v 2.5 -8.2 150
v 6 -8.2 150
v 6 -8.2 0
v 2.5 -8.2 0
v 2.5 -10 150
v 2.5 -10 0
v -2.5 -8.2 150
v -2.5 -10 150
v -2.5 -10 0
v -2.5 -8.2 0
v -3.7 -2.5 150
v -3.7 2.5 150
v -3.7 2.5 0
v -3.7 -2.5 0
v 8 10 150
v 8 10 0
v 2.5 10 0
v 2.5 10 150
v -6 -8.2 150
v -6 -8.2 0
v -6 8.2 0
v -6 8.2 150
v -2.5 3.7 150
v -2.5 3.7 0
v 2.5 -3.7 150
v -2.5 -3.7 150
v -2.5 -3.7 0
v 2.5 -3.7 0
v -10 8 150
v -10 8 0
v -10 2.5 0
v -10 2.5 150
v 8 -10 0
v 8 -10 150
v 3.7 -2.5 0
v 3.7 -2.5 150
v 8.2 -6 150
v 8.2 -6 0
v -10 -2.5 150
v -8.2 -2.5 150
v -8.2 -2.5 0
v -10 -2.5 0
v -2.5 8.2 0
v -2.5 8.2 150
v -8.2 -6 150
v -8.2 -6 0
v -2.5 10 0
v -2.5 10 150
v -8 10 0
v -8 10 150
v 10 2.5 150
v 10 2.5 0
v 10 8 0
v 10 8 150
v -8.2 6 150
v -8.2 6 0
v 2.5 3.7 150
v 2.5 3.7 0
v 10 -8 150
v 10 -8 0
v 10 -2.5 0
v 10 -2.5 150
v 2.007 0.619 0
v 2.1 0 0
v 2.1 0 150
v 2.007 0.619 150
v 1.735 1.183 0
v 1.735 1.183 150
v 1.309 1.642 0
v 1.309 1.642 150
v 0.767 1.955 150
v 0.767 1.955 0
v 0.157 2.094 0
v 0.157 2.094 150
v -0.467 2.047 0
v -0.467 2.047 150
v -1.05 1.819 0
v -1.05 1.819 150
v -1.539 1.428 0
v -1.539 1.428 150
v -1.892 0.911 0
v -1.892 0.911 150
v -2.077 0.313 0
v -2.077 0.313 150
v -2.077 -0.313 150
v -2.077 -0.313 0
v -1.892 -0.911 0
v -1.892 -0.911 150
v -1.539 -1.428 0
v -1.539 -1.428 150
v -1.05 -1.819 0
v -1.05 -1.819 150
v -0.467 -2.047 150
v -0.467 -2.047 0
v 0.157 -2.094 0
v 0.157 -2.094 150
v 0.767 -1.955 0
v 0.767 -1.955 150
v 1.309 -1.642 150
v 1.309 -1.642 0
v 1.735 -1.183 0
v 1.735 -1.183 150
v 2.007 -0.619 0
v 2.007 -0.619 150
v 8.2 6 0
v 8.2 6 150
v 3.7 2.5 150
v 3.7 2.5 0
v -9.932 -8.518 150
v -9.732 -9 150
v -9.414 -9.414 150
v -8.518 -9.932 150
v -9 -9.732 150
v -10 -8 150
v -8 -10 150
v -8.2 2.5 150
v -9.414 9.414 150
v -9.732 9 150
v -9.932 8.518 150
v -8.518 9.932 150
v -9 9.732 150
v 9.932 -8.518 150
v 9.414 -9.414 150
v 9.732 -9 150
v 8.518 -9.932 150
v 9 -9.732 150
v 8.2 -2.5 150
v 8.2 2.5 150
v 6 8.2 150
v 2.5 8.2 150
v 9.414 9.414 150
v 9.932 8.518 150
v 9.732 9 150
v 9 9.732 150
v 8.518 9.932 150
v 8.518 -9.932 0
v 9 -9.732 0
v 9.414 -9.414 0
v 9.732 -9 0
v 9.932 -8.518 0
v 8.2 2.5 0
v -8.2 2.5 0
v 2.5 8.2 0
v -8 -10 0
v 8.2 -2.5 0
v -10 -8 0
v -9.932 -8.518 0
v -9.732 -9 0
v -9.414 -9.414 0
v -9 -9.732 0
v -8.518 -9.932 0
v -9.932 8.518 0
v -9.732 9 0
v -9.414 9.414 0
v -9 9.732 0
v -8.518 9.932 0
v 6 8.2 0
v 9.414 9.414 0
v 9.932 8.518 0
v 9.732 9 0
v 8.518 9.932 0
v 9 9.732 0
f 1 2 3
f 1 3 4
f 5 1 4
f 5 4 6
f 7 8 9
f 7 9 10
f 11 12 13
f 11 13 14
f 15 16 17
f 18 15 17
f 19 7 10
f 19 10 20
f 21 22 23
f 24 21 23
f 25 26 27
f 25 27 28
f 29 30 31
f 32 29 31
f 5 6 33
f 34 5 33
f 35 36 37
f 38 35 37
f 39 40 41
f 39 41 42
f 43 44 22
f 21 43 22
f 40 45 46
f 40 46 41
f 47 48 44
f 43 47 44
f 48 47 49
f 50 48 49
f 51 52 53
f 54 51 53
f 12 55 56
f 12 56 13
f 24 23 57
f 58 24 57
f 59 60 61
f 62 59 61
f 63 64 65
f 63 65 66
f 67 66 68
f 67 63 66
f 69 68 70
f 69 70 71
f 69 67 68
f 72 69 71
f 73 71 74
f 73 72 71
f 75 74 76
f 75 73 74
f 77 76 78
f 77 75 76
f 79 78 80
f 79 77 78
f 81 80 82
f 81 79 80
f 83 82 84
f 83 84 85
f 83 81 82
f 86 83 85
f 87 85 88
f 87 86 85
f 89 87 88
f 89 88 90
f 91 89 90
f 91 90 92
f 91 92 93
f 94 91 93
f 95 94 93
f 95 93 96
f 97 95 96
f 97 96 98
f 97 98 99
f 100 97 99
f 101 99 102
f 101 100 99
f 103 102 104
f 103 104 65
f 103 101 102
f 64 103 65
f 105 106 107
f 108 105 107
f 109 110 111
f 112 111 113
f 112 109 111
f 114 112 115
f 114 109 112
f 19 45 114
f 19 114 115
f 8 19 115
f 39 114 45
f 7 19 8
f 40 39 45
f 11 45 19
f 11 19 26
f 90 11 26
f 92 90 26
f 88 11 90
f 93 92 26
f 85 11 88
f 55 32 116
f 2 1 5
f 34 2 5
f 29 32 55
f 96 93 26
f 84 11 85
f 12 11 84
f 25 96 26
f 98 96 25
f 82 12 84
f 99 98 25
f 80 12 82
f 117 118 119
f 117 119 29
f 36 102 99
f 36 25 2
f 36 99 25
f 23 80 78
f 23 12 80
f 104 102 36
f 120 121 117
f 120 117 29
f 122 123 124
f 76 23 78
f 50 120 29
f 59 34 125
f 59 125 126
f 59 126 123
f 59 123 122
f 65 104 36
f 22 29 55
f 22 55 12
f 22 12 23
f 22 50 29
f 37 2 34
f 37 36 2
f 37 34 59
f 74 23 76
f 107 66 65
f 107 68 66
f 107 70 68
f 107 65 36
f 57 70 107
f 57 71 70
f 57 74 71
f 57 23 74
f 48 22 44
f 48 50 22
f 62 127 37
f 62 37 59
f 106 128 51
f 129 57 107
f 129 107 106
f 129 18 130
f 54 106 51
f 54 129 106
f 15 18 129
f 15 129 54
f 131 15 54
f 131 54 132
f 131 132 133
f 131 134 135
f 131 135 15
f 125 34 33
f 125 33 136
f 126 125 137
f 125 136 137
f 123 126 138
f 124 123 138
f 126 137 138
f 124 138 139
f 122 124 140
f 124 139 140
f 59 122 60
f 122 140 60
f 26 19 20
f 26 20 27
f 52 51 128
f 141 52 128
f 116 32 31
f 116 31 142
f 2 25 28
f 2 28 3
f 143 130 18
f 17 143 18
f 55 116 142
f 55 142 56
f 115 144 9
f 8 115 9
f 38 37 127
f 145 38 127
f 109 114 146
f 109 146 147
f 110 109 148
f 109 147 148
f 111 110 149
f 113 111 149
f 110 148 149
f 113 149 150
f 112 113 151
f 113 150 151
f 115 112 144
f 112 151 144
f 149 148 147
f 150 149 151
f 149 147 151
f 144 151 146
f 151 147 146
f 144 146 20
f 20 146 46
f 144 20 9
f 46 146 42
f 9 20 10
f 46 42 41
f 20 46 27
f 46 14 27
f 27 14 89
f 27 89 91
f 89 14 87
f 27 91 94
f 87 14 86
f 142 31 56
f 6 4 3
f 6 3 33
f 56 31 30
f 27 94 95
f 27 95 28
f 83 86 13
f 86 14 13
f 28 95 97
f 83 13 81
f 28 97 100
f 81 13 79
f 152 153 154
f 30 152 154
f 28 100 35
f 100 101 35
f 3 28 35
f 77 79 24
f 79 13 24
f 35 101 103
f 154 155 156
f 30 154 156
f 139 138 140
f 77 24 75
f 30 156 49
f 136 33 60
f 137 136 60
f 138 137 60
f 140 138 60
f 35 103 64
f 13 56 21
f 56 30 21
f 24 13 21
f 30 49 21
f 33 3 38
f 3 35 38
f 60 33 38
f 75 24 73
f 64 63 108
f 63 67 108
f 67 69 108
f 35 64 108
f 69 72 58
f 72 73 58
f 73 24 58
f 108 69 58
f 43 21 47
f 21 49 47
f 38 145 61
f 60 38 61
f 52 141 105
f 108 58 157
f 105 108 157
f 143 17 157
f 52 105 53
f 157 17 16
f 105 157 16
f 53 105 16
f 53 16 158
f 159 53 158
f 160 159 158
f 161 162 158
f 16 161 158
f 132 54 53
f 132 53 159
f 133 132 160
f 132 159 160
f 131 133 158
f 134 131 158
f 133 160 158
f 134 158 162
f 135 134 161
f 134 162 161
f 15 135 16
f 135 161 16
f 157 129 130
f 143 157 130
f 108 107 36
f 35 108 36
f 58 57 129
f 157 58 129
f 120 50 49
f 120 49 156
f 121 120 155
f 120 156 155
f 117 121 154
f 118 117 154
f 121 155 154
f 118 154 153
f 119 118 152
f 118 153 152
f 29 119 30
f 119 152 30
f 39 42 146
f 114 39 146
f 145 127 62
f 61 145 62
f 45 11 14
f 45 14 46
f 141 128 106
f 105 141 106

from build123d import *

# Parameters (mm, degrees)
EXTRUSION1_DEPTH        = 150
PER_AGE1_OUTLINE_R      = 2.1
PER_AGE1_DEPTH          = 150
ENL_V_MAT_EXTRU_1_DEPTH = 300
ENL_V_MAT_EXTRU_3_DEPTH = 300
ENL_V_MAT_EXTRU_4_DEPTH = 151.665191733
ENL_V_MAT_EXTRU_7_DEPTH = 151.665191733


# Read off the part's stored shape, not the designer's step: Perçage1
with BuildPart() as part:
    # Esquisse1 → Extrusion1 (new body)
    with BuildSketch(Plane.XY):
        with BuildLine():
            Line((-10, 8), (-10, -8))
            ThreePointArc((-10, -8), (-9.414213562, -9.414213562), (-8, -10))
            Line((-8, -10), (8, -10))
            ThreePointArc((8, -10), (9.414213562, -9.414213562), (10, -8))
            Line((10, -8), (10, 8))
            ThreePointArc((10, 8), (9.414213562, 9.414213562), (8, 10))
            Line((8, 10), (-8, 10))
            ThreePointArc((-8, 10), (-9.414213562, 9.414213562), (-10, 8))
        make_face()
    extrude(amount=EXTRUSION1_DEPTH)

    # Perçage1 outline → Perçage1 (cut)
    with BuildSketch(Plane.XY):
        Circle(PER_AGE1_OUTLINE_R)
    extrude(amount=PER_AGE1_DEPTH, mode=Mode.SUBTRACT)

    # Esquisse3 → Enlèv. mat.-Extru.1 (cut)
    with BuildSketch(Plane.XY.offset(150)):
        Polygon((10, 2.5), (8.2, 2.5), (8.2, 6), (3.7, 2.5), (3.7, -2.5), (8.2, -6), (8.2, -2.5), (10, -2.5), align=None)
    extrude(amount=-ENL_V_MAT_EXTRU_1_DEPTH, mode=Mode.SUBTRACT)

    # Esquisse5 → Enlèv. mat.-Extru.3 (cut)
    with BuildSketch(Plane.XY.offset(150)):
        Polygon((-2.5, 10), (-2.5, 8.2), (-6, 8.2), (-2.5, 3.7), (2.5, 3.7), (6, 8.2), (2.5, 8.2), (2.5, 10), align=None)
    extrude(amount=-ENL_V_MAT_EXTRU_3_DEPTH, mode=Mode.SUBTRACT)

    # Esquisse6 → Enlèv. mat.-Extru.4 (cut, through all)
    with BuildSketch(Plane.XY.offset(150)):
        Polygon((-2.5, -10), (-2.5, -8.2), (-6, -8.2), (-2.5, -3.7), (2.5, -3.7), (6, -8.2), (2.5, -8.2), (2.5, -10), align=None)
    extrude(amount=-ENL_V_MAT_EXTRU_4_DEPTH, mode=Mode.SUBTRACT)

    # Esquisse4 → Enlèv. mat.-Extru.7 (cut, through all)
    with BuildSketch(Plane.XY.offset(150)):
        Polygon((-10, 2.5), (-8.2, 2.5), (-8.2, 6), (-3.7, 2.5), (-3.7, -2.5), (-8.2, -6), (-8.2, -2.5), (-10, -2.5), align=None)
    extrude(amount=-ENL_V_MAT_EXTRU_7_DEPTH, mode=Mode.SUBTRACT)


solid = part.part
